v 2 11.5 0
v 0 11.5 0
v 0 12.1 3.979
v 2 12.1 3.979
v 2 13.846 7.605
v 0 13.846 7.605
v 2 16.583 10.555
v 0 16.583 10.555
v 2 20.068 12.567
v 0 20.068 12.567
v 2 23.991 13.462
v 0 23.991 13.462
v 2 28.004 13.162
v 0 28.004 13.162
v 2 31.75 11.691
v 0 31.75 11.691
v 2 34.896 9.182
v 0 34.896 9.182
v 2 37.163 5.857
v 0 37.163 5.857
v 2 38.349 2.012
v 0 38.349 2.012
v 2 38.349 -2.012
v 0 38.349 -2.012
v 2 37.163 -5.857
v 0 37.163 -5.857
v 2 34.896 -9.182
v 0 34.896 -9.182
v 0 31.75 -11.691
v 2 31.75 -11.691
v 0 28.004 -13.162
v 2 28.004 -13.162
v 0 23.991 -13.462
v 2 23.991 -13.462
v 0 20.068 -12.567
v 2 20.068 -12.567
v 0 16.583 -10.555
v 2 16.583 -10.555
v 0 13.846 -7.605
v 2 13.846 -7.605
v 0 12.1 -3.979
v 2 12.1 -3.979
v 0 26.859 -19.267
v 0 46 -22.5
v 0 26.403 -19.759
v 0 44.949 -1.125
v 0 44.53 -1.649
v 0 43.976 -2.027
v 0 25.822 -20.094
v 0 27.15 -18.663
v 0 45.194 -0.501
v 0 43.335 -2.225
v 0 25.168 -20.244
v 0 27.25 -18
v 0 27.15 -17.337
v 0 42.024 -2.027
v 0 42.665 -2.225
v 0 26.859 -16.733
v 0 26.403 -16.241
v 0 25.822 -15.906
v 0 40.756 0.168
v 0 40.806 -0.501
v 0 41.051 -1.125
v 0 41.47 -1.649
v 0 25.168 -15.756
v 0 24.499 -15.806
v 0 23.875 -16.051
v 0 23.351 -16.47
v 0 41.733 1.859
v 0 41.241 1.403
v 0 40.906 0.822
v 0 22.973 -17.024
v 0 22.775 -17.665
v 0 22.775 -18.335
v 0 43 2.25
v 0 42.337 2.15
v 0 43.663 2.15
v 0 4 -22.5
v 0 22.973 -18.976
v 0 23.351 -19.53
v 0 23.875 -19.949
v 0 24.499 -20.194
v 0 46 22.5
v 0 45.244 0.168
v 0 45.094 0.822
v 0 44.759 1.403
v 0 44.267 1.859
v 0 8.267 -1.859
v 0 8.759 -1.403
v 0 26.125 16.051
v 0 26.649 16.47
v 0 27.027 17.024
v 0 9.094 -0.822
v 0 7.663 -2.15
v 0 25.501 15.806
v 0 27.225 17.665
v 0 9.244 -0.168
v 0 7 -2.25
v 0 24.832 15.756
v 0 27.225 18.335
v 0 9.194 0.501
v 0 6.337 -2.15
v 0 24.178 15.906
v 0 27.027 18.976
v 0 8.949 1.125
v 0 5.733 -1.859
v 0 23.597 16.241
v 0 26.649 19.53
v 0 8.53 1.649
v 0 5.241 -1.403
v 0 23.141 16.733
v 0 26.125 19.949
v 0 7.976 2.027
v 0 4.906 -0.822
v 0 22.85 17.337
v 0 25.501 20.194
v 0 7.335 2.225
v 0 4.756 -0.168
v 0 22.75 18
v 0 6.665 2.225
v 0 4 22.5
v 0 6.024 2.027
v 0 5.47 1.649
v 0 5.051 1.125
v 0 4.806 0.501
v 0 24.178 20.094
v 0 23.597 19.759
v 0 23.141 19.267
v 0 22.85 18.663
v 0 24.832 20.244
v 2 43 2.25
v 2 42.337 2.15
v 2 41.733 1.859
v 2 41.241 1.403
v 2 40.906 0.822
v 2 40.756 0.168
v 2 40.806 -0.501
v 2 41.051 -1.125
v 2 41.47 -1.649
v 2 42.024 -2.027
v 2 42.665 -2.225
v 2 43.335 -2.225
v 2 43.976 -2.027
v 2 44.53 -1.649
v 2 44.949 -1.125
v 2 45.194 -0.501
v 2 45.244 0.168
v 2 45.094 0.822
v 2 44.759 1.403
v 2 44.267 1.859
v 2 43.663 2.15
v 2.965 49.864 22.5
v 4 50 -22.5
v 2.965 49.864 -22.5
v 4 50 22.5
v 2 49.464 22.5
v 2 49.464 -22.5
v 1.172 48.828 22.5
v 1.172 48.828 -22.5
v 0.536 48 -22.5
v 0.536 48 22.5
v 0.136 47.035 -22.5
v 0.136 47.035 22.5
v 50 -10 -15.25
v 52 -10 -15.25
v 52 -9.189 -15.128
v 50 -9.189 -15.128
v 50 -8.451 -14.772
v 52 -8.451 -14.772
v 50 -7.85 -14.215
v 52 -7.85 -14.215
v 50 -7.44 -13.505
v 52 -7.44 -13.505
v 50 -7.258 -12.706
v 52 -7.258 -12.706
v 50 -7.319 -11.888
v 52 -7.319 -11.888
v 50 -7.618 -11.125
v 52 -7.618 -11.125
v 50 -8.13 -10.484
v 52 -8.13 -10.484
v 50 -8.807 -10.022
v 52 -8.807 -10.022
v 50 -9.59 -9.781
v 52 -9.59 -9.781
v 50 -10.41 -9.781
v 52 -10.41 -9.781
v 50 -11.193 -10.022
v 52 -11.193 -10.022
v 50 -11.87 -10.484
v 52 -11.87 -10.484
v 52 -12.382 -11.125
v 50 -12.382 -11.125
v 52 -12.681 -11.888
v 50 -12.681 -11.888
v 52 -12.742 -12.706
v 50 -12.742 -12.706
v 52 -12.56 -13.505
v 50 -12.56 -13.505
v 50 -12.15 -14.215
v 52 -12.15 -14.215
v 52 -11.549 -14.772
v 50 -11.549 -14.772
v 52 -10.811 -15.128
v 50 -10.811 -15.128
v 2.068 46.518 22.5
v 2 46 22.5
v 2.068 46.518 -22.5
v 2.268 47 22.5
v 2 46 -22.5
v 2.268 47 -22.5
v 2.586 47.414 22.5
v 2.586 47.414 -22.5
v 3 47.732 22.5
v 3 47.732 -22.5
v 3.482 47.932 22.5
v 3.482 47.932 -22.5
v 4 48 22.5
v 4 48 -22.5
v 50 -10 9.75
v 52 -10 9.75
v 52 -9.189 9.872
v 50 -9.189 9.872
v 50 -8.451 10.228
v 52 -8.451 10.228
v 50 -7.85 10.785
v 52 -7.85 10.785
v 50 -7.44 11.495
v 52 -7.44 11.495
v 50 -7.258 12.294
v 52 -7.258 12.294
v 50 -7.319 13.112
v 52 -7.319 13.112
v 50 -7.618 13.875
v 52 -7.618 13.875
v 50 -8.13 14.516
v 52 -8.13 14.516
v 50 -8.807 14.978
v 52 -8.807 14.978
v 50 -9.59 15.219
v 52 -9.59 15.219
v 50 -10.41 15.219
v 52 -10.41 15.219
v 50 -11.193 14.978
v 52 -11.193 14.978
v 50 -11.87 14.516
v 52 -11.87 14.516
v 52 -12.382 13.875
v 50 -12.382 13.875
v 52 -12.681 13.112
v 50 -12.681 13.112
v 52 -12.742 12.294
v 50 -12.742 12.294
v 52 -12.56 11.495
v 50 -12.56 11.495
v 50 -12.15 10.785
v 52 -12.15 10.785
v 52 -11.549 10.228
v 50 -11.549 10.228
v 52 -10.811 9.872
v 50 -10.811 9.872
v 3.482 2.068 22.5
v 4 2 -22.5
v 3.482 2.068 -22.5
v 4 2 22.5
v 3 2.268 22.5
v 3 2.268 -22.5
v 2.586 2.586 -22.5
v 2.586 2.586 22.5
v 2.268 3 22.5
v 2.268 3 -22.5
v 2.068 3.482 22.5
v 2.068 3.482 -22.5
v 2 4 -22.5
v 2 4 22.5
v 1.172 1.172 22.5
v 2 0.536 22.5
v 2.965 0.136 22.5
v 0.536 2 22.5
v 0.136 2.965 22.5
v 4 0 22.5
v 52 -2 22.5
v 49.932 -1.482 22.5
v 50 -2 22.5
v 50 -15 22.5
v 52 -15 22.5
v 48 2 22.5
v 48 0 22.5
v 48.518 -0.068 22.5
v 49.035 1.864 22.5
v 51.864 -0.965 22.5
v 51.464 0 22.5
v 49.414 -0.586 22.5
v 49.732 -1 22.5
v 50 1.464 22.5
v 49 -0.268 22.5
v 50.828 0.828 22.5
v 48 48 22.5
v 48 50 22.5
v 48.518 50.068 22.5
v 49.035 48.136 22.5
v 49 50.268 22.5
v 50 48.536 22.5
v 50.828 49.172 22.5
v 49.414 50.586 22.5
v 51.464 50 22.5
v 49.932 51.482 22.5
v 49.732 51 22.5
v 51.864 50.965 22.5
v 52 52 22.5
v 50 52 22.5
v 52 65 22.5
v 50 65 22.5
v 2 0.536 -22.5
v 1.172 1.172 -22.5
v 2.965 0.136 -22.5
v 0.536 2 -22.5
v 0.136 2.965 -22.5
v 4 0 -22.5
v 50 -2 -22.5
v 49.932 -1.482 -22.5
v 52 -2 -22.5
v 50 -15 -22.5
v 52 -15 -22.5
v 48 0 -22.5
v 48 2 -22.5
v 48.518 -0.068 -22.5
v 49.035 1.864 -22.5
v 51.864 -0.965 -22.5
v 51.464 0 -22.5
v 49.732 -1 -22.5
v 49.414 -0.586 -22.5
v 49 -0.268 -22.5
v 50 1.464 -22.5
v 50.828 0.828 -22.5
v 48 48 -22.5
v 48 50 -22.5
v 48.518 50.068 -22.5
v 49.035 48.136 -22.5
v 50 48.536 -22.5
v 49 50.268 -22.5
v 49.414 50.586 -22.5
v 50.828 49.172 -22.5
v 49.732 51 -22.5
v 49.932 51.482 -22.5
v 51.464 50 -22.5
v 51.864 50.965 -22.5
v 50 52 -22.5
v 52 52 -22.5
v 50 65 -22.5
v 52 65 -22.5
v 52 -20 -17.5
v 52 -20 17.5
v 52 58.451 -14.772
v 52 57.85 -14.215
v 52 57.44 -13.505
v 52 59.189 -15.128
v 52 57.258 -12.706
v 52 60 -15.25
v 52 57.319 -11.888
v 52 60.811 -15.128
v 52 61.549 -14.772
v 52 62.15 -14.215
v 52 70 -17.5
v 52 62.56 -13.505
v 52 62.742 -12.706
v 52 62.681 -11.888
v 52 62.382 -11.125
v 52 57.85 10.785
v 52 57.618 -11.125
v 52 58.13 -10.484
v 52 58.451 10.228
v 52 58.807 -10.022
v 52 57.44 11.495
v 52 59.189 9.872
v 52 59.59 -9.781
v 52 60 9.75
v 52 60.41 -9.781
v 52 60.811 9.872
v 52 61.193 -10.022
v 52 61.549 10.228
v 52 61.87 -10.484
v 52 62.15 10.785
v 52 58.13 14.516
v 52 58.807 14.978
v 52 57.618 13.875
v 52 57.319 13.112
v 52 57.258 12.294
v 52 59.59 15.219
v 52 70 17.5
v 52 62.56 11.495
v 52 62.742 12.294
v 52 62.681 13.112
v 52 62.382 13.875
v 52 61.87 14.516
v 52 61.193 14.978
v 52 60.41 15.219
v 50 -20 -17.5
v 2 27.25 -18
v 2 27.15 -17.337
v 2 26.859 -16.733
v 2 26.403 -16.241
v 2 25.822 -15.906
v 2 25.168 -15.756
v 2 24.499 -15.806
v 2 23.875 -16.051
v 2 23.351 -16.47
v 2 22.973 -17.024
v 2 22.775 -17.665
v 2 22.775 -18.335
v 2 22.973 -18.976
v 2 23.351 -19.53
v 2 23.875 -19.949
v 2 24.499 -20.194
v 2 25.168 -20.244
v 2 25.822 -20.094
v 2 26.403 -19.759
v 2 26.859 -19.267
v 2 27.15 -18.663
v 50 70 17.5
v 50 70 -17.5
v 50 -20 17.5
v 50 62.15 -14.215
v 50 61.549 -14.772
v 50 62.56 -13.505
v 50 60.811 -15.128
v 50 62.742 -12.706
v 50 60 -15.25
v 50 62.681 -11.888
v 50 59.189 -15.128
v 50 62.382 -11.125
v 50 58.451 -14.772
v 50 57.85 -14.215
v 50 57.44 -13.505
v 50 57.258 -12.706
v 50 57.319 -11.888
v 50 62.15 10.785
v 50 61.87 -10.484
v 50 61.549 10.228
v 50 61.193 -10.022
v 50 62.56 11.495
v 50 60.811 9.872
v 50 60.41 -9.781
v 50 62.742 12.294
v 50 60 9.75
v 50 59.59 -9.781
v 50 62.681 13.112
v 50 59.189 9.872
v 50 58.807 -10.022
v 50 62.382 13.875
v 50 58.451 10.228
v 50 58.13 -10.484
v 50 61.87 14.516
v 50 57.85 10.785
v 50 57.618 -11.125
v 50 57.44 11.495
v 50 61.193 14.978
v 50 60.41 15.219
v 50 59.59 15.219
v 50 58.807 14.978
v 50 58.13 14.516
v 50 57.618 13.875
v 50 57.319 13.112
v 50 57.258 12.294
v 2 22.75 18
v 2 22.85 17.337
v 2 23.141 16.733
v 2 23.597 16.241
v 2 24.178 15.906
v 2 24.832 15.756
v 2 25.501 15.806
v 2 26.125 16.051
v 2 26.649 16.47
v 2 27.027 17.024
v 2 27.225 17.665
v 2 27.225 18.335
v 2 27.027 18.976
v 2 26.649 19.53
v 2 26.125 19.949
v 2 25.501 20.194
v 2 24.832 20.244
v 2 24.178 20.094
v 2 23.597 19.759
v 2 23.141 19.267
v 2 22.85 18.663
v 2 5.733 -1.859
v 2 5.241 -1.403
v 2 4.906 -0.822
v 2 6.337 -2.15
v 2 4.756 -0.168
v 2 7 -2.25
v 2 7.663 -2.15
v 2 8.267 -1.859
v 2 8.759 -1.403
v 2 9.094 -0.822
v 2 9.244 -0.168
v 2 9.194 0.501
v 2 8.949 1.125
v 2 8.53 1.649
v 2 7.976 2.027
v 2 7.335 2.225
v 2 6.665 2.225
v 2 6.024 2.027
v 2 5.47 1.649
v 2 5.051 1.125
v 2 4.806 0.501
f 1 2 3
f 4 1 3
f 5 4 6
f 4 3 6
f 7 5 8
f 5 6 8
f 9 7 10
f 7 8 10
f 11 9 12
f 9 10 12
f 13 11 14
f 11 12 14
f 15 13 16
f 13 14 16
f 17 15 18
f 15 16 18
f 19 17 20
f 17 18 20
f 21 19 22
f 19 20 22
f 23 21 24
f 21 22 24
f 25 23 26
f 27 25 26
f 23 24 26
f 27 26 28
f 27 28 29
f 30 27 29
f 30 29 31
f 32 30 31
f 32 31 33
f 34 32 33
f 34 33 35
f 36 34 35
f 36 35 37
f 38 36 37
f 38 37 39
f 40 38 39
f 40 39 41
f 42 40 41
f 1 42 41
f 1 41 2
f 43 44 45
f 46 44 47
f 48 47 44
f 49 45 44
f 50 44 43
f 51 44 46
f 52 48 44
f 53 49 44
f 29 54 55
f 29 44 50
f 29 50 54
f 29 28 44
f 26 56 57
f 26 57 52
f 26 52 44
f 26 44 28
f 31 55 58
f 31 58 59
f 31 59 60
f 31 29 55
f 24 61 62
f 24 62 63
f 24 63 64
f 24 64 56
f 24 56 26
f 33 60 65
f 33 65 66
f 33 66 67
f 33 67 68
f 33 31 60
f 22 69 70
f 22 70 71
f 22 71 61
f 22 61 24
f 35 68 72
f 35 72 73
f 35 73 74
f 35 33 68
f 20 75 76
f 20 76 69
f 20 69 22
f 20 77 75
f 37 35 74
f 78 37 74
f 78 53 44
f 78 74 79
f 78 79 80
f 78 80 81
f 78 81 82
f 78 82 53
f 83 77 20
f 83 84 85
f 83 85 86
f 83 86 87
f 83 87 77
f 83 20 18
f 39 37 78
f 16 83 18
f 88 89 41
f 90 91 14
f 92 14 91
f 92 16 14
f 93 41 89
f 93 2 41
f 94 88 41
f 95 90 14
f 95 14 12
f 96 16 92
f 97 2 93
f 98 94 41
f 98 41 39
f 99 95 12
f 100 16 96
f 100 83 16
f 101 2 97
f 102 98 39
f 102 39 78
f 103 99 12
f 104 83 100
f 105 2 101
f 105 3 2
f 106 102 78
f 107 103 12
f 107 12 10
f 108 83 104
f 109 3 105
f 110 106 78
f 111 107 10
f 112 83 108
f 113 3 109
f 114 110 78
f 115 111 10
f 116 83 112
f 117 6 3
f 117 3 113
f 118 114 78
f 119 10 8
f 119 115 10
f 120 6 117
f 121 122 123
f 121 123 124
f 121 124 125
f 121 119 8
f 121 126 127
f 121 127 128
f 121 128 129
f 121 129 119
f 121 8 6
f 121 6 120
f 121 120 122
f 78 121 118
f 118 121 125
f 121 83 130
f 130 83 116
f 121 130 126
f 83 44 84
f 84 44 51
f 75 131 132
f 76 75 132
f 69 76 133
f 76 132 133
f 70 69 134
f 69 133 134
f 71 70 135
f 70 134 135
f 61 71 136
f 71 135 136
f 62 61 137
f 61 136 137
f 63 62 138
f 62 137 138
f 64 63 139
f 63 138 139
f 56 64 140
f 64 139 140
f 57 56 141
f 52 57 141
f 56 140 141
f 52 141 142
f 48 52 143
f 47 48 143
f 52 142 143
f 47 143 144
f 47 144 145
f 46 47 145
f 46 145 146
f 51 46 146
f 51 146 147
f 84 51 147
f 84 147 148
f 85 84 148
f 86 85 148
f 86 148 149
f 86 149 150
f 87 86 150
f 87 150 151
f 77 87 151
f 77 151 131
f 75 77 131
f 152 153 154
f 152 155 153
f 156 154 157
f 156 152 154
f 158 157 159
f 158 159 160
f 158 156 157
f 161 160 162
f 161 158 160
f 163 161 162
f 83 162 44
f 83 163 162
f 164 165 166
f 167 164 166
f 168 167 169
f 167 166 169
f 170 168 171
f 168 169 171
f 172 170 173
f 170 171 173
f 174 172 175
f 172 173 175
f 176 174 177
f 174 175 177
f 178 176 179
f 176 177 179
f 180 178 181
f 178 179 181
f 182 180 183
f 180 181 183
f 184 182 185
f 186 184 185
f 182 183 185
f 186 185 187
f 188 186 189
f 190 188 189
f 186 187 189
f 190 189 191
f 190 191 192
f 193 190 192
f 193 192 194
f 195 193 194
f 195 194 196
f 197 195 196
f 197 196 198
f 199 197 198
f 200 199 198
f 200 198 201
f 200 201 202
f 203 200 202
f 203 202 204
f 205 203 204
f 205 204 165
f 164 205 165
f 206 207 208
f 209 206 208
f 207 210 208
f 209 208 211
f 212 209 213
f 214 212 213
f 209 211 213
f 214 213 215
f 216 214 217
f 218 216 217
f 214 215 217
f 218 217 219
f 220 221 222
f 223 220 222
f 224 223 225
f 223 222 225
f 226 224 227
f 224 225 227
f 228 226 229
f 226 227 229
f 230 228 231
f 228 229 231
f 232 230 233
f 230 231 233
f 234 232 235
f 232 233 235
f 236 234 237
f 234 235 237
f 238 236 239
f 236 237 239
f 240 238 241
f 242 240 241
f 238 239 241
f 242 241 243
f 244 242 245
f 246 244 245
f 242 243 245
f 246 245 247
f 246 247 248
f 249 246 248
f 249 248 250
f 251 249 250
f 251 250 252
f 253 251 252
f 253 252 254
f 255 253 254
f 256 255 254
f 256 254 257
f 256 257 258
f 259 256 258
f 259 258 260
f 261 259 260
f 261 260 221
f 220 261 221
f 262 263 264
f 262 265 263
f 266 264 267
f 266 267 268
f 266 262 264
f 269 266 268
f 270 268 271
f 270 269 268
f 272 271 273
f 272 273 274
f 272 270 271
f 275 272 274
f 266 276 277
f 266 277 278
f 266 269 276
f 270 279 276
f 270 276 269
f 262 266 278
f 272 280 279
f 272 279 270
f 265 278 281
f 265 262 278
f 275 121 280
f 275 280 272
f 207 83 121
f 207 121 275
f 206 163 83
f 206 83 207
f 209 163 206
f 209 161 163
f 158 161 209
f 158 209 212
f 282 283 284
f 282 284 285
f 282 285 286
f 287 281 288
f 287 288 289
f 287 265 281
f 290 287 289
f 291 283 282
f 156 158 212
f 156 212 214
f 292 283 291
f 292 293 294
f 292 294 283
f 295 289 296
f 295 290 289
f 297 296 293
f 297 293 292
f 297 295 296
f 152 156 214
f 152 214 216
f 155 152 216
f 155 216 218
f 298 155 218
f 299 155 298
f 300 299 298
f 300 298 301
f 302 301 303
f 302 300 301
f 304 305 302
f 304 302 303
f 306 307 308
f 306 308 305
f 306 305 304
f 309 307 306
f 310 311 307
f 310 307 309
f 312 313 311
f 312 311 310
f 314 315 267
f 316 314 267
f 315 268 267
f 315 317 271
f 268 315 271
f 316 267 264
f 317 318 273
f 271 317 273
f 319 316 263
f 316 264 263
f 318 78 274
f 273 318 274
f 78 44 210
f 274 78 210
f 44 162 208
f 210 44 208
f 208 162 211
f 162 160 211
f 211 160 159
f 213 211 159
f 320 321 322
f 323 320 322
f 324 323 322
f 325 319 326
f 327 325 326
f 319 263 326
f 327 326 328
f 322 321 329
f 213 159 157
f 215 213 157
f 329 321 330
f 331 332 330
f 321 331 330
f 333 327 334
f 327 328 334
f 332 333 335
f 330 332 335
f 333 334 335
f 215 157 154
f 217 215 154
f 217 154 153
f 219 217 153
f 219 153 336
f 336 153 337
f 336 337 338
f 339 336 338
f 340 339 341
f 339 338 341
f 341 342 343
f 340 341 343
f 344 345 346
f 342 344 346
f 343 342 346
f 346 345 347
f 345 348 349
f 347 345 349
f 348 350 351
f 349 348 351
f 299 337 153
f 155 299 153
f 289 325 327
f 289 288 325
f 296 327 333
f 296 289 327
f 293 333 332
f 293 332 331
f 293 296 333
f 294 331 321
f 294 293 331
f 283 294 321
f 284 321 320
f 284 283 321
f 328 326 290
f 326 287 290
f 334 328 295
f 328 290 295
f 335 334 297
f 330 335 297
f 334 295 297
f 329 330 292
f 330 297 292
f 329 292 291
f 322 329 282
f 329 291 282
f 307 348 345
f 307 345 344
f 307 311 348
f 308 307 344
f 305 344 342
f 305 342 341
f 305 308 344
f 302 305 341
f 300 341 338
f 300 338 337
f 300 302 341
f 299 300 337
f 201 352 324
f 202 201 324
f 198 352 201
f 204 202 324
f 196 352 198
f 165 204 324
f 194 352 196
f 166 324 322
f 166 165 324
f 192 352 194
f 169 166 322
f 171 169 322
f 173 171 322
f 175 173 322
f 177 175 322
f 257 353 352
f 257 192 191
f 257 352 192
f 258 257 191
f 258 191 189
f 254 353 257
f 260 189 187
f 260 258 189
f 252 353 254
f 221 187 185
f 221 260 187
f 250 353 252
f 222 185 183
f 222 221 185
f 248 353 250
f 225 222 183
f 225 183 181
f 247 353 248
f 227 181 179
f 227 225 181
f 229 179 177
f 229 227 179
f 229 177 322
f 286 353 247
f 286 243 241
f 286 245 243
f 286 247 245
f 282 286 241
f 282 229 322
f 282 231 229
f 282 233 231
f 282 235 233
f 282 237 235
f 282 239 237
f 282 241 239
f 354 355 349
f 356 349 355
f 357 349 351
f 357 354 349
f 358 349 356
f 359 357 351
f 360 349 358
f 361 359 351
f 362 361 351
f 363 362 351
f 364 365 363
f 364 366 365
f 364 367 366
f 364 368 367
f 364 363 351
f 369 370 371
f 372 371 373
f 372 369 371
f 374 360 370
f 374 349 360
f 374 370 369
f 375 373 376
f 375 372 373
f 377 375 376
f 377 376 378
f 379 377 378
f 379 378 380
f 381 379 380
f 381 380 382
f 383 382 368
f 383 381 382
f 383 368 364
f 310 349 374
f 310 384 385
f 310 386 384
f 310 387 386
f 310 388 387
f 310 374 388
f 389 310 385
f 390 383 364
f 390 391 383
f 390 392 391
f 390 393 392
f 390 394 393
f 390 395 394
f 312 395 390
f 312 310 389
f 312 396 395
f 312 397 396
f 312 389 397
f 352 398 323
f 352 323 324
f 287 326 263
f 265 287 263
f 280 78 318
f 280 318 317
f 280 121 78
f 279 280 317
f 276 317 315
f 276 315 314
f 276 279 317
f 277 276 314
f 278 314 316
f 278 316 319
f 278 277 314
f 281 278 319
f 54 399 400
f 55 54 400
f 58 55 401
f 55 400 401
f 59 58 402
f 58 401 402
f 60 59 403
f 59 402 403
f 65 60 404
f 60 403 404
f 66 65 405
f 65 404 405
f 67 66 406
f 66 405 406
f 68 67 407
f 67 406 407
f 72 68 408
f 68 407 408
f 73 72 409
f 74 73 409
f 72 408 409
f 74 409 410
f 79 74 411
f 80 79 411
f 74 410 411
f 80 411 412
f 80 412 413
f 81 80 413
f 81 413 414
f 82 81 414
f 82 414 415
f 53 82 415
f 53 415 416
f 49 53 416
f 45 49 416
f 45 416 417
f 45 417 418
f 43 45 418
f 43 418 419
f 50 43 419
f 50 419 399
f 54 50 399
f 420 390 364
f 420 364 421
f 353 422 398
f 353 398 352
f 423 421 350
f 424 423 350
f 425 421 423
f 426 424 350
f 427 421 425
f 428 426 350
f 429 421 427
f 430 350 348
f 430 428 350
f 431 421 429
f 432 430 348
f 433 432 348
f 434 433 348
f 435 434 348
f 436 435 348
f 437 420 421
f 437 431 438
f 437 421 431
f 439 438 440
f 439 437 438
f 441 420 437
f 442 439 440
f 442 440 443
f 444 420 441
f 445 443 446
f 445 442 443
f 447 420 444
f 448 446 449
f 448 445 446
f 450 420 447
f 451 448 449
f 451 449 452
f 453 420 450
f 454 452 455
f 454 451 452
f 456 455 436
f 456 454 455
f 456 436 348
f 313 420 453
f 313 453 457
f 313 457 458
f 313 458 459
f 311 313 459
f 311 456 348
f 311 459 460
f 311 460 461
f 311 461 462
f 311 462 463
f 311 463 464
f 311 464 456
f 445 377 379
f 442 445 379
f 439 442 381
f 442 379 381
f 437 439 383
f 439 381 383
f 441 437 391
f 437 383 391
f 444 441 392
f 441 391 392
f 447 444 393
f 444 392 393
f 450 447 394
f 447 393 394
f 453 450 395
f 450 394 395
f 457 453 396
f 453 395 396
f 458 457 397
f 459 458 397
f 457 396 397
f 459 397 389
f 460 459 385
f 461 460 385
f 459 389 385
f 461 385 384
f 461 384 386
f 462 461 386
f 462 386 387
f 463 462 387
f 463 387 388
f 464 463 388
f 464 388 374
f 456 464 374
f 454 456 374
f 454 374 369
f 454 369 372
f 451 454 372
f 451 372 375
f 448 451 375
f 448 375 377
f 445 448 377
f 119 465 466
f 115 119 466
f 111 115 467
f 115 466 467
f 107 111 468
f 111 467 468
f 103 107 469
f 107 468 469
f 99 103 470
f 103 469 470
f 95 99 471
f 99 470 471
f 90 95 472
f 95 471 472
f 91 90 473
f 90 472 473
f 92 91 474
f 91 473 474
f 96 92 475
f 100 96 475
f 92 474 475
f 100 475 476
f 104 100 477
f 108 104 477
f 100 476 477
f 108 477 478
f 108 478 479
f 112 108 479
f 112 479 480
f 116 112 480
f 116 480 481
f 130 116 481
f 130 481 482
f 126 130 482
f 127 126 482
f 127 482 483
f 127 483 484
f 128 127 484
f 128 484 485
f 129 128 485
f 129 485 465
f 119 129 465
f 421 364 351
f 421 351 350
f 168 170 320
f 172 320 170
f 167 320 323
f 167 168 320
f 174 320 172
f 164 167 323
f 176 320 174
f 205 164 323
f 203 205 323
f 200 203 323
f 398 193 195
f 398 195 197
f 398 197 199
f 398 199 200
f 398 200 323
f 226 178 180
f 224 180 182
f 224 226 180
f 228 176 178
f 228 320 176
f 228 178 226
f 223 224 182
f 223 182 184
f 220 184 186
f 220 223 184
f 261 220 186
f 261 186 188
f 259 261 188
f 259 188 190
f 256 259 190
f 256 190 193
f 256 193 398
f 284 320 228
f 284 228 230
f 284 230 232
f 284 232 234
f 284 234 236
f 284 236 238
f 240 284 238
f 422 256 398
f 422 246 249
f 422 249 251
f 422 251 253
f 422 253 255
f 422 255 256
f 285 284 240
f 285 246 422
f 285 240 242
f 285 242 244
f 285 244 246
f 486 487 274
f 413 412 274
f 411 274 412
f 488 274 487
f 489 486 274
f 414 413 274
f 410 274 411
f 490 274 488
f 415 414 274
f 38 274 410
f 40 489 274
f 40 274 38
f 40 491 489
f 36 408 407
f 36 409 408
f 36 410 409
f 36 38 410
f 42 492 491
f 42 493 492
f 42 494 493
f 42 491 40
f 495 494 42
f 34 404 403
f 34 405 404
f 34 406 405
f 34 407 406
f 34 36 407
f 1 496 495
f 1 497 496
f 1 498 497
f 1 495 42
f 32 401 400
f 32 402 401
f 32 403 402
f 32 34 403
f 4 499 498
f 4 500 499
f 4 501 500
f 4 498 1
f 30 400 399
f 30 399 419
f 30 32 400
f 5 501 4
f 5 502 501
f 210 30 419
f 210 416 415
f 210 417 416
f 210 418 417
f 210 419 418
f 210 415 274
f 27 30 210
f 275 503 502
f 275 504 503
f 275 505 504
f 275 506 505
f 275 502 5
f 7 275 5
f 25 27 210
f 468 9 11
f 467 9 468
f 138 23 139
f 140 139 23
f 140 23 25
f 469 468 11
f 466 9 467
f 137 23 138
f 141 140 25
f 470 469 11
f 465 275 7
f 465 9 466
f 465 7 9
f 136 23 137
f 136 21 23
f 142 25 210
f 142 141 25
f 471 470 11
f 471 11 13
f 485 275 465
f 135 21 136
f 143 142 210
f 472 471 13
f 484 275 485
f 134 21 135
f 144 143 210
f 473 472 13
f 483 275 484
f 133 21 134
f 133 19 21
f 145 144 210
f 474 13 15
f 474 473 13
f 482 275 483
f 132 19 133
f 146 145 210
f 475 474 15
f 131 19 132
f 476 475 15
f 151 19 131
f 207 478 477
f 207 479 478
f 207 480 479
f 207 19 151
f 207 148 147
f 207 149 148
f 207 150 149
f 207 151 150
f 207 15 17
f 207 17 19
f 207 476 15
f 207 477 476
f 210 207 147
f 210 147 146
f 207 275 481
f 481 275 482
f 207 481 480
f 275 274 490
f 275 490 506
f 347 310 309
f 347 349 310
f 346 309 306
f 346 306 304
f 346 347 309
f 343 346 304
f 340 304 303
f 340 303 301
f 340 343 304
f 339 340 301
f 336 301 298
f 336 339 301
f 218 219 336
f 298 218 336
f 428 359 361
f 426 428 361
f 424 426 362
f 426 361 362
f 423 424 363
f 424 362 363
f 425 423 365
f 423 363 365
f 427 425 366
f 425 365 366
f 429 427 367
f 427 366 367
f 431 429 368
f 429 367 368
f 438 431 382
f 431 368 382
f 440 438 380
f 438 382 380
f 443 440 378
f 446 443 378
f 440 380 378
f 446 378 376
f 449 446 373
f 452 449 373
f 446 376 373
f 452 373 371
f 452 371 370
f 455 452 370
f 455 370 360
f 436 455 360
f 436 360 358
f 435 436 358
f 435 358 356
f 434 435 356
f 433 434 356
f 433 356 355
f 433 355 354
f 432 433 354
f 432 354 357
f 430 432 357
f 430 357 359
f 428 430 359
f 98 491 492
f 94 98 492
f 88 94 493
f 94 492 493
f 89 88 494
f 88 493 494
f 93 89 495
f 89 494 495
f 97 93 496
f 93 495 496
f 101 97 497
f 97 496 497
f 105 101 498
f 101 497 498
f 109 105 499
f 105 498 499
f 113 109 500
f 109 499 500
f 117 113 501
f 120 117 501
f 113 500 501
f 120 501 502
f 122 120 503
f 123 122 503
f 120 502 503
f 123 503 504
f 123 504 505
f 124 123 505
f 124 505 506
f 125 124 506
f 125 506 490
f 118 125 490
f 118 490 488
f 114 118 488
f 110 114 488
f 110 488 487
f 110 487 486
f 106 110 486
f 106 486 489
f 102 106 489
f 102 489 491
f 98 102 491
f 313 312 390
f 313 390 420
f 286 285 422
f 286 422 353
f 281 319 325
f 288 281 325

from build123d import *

# Parameters (mm, degrees)
BOSS_EXTRU_1_DEPTH           = 22.5
D_GAGEMENT_M51_D             = 5.5
D_GAGEMENT_M42_D             = 4.5
R_P_TITION_CIRCULAIRE2_COUNT = 4
CONG_1_R                     = 2
CHANFREIN1_SIZE              = 5
CONG_2_R                     = 4
ENL_V_MAT_EXTRU_1_REACH      = 92.057
ESQUISSE16_R                 = 13.5


with BuildPart() as part:
    # Esquisse1 → Boss.-Extru.1 (new, symmetric)
    with BuildSketch(Plane.XY):
        Polygon((52, 70), (50, 70), (50, 50), (0, 50), (0, 0), (50, 0), (50, -20), (52, -20), (52, 2), (2, 2), (2, 48), (52, 48), align=None)
    extrude(amount=BOSS_EXTRU_1_DEPTH, both=True)

    # Dégagement M51 (through all)
    with Locations(Plane.ZY.offset(-50)):
        with Locations((12.5, 60), (-12.5, 60), (-12.5, -10), (12.5, -10)):
            Hole(D_GAGEMENT_M51_D / 2)

    # Dégagement M42 (through all)
    with Locations(Plane.ZY):
        with Locations((0, 7)):
            d_gagement_m42 = Hole(D_GAGEMENT_M42_D / 2)

    # Répétition circulaire2: Dégagement M42 ×4 about axis
    r_p_tition_circulaire2_axis = Axis((0, 25, 0), (1, 0, 0))
    for i in range(1, R_P_TITION_CIRCULAIRE2_COUNT):
        add(d_gagement_m42.rotate(r_p_tition_circulaire2_axis, i * 360 / R_P_TITION_CIRCULAIRE2_COUNT), mode=Mode.SUBTRACT)

    # Congé1
    cong_1_edges = [part.edges().sort_by_distance(p)[0] for p in [
        (2, 48, 0),
        (2, 2, 0),
        (50, 0, 0),
        (50, 50, 0),
    ]]
    fillet(cong_1_edges, radius=CONG_1_R)

    # Chanfrein1
    chanfrein1_edges = [part.edges().sort_by_distance(p)[0] for p in [
        (51, -20, -22.5),
        (51, 70, -22.5),
        (51, -20, 22.5),
        (51, 70, 22.5),
    ]]
    chamfer(chanfrein1_edges, length=CHANFREIN1_SIZE)

    # Congé2
    cong_2_edges = [part.edges().sort_by_distance(p)[0] for p in [
        (52, 48, 0),
        (52, 2, 0),
        (0, 0, 0),
        (0, 50, 0),
    ]]
    fillet(cong_2_edges, radius=CONG_2_R)

    # Esquisse16 → Enlèv. mat.-Extru.1 (cut, up to next)
    with BuildSketch(Plane.ZY, mode=Mode.PRIVATE) as enl_v_mat_extru_1_sk1:
        with Locations(Location((0, 25, 0), (0, 0, 270))):
            Circle(ESQUISSE16_R)
    enl_v_mat_extru_1_tool1 = extrude(enl_v_mat_extru_1_sk1.sketch, amount=-ENL_V_MAT_EXTRU_1_REACH, mode=Mode.PRIVATE) & part.part
    add(enl_v_mat_extru_1_tool1.solids().sort_by_distance((0, 25, 0))[0], mode=Mode.SUBTRACT)


solid = part.part
